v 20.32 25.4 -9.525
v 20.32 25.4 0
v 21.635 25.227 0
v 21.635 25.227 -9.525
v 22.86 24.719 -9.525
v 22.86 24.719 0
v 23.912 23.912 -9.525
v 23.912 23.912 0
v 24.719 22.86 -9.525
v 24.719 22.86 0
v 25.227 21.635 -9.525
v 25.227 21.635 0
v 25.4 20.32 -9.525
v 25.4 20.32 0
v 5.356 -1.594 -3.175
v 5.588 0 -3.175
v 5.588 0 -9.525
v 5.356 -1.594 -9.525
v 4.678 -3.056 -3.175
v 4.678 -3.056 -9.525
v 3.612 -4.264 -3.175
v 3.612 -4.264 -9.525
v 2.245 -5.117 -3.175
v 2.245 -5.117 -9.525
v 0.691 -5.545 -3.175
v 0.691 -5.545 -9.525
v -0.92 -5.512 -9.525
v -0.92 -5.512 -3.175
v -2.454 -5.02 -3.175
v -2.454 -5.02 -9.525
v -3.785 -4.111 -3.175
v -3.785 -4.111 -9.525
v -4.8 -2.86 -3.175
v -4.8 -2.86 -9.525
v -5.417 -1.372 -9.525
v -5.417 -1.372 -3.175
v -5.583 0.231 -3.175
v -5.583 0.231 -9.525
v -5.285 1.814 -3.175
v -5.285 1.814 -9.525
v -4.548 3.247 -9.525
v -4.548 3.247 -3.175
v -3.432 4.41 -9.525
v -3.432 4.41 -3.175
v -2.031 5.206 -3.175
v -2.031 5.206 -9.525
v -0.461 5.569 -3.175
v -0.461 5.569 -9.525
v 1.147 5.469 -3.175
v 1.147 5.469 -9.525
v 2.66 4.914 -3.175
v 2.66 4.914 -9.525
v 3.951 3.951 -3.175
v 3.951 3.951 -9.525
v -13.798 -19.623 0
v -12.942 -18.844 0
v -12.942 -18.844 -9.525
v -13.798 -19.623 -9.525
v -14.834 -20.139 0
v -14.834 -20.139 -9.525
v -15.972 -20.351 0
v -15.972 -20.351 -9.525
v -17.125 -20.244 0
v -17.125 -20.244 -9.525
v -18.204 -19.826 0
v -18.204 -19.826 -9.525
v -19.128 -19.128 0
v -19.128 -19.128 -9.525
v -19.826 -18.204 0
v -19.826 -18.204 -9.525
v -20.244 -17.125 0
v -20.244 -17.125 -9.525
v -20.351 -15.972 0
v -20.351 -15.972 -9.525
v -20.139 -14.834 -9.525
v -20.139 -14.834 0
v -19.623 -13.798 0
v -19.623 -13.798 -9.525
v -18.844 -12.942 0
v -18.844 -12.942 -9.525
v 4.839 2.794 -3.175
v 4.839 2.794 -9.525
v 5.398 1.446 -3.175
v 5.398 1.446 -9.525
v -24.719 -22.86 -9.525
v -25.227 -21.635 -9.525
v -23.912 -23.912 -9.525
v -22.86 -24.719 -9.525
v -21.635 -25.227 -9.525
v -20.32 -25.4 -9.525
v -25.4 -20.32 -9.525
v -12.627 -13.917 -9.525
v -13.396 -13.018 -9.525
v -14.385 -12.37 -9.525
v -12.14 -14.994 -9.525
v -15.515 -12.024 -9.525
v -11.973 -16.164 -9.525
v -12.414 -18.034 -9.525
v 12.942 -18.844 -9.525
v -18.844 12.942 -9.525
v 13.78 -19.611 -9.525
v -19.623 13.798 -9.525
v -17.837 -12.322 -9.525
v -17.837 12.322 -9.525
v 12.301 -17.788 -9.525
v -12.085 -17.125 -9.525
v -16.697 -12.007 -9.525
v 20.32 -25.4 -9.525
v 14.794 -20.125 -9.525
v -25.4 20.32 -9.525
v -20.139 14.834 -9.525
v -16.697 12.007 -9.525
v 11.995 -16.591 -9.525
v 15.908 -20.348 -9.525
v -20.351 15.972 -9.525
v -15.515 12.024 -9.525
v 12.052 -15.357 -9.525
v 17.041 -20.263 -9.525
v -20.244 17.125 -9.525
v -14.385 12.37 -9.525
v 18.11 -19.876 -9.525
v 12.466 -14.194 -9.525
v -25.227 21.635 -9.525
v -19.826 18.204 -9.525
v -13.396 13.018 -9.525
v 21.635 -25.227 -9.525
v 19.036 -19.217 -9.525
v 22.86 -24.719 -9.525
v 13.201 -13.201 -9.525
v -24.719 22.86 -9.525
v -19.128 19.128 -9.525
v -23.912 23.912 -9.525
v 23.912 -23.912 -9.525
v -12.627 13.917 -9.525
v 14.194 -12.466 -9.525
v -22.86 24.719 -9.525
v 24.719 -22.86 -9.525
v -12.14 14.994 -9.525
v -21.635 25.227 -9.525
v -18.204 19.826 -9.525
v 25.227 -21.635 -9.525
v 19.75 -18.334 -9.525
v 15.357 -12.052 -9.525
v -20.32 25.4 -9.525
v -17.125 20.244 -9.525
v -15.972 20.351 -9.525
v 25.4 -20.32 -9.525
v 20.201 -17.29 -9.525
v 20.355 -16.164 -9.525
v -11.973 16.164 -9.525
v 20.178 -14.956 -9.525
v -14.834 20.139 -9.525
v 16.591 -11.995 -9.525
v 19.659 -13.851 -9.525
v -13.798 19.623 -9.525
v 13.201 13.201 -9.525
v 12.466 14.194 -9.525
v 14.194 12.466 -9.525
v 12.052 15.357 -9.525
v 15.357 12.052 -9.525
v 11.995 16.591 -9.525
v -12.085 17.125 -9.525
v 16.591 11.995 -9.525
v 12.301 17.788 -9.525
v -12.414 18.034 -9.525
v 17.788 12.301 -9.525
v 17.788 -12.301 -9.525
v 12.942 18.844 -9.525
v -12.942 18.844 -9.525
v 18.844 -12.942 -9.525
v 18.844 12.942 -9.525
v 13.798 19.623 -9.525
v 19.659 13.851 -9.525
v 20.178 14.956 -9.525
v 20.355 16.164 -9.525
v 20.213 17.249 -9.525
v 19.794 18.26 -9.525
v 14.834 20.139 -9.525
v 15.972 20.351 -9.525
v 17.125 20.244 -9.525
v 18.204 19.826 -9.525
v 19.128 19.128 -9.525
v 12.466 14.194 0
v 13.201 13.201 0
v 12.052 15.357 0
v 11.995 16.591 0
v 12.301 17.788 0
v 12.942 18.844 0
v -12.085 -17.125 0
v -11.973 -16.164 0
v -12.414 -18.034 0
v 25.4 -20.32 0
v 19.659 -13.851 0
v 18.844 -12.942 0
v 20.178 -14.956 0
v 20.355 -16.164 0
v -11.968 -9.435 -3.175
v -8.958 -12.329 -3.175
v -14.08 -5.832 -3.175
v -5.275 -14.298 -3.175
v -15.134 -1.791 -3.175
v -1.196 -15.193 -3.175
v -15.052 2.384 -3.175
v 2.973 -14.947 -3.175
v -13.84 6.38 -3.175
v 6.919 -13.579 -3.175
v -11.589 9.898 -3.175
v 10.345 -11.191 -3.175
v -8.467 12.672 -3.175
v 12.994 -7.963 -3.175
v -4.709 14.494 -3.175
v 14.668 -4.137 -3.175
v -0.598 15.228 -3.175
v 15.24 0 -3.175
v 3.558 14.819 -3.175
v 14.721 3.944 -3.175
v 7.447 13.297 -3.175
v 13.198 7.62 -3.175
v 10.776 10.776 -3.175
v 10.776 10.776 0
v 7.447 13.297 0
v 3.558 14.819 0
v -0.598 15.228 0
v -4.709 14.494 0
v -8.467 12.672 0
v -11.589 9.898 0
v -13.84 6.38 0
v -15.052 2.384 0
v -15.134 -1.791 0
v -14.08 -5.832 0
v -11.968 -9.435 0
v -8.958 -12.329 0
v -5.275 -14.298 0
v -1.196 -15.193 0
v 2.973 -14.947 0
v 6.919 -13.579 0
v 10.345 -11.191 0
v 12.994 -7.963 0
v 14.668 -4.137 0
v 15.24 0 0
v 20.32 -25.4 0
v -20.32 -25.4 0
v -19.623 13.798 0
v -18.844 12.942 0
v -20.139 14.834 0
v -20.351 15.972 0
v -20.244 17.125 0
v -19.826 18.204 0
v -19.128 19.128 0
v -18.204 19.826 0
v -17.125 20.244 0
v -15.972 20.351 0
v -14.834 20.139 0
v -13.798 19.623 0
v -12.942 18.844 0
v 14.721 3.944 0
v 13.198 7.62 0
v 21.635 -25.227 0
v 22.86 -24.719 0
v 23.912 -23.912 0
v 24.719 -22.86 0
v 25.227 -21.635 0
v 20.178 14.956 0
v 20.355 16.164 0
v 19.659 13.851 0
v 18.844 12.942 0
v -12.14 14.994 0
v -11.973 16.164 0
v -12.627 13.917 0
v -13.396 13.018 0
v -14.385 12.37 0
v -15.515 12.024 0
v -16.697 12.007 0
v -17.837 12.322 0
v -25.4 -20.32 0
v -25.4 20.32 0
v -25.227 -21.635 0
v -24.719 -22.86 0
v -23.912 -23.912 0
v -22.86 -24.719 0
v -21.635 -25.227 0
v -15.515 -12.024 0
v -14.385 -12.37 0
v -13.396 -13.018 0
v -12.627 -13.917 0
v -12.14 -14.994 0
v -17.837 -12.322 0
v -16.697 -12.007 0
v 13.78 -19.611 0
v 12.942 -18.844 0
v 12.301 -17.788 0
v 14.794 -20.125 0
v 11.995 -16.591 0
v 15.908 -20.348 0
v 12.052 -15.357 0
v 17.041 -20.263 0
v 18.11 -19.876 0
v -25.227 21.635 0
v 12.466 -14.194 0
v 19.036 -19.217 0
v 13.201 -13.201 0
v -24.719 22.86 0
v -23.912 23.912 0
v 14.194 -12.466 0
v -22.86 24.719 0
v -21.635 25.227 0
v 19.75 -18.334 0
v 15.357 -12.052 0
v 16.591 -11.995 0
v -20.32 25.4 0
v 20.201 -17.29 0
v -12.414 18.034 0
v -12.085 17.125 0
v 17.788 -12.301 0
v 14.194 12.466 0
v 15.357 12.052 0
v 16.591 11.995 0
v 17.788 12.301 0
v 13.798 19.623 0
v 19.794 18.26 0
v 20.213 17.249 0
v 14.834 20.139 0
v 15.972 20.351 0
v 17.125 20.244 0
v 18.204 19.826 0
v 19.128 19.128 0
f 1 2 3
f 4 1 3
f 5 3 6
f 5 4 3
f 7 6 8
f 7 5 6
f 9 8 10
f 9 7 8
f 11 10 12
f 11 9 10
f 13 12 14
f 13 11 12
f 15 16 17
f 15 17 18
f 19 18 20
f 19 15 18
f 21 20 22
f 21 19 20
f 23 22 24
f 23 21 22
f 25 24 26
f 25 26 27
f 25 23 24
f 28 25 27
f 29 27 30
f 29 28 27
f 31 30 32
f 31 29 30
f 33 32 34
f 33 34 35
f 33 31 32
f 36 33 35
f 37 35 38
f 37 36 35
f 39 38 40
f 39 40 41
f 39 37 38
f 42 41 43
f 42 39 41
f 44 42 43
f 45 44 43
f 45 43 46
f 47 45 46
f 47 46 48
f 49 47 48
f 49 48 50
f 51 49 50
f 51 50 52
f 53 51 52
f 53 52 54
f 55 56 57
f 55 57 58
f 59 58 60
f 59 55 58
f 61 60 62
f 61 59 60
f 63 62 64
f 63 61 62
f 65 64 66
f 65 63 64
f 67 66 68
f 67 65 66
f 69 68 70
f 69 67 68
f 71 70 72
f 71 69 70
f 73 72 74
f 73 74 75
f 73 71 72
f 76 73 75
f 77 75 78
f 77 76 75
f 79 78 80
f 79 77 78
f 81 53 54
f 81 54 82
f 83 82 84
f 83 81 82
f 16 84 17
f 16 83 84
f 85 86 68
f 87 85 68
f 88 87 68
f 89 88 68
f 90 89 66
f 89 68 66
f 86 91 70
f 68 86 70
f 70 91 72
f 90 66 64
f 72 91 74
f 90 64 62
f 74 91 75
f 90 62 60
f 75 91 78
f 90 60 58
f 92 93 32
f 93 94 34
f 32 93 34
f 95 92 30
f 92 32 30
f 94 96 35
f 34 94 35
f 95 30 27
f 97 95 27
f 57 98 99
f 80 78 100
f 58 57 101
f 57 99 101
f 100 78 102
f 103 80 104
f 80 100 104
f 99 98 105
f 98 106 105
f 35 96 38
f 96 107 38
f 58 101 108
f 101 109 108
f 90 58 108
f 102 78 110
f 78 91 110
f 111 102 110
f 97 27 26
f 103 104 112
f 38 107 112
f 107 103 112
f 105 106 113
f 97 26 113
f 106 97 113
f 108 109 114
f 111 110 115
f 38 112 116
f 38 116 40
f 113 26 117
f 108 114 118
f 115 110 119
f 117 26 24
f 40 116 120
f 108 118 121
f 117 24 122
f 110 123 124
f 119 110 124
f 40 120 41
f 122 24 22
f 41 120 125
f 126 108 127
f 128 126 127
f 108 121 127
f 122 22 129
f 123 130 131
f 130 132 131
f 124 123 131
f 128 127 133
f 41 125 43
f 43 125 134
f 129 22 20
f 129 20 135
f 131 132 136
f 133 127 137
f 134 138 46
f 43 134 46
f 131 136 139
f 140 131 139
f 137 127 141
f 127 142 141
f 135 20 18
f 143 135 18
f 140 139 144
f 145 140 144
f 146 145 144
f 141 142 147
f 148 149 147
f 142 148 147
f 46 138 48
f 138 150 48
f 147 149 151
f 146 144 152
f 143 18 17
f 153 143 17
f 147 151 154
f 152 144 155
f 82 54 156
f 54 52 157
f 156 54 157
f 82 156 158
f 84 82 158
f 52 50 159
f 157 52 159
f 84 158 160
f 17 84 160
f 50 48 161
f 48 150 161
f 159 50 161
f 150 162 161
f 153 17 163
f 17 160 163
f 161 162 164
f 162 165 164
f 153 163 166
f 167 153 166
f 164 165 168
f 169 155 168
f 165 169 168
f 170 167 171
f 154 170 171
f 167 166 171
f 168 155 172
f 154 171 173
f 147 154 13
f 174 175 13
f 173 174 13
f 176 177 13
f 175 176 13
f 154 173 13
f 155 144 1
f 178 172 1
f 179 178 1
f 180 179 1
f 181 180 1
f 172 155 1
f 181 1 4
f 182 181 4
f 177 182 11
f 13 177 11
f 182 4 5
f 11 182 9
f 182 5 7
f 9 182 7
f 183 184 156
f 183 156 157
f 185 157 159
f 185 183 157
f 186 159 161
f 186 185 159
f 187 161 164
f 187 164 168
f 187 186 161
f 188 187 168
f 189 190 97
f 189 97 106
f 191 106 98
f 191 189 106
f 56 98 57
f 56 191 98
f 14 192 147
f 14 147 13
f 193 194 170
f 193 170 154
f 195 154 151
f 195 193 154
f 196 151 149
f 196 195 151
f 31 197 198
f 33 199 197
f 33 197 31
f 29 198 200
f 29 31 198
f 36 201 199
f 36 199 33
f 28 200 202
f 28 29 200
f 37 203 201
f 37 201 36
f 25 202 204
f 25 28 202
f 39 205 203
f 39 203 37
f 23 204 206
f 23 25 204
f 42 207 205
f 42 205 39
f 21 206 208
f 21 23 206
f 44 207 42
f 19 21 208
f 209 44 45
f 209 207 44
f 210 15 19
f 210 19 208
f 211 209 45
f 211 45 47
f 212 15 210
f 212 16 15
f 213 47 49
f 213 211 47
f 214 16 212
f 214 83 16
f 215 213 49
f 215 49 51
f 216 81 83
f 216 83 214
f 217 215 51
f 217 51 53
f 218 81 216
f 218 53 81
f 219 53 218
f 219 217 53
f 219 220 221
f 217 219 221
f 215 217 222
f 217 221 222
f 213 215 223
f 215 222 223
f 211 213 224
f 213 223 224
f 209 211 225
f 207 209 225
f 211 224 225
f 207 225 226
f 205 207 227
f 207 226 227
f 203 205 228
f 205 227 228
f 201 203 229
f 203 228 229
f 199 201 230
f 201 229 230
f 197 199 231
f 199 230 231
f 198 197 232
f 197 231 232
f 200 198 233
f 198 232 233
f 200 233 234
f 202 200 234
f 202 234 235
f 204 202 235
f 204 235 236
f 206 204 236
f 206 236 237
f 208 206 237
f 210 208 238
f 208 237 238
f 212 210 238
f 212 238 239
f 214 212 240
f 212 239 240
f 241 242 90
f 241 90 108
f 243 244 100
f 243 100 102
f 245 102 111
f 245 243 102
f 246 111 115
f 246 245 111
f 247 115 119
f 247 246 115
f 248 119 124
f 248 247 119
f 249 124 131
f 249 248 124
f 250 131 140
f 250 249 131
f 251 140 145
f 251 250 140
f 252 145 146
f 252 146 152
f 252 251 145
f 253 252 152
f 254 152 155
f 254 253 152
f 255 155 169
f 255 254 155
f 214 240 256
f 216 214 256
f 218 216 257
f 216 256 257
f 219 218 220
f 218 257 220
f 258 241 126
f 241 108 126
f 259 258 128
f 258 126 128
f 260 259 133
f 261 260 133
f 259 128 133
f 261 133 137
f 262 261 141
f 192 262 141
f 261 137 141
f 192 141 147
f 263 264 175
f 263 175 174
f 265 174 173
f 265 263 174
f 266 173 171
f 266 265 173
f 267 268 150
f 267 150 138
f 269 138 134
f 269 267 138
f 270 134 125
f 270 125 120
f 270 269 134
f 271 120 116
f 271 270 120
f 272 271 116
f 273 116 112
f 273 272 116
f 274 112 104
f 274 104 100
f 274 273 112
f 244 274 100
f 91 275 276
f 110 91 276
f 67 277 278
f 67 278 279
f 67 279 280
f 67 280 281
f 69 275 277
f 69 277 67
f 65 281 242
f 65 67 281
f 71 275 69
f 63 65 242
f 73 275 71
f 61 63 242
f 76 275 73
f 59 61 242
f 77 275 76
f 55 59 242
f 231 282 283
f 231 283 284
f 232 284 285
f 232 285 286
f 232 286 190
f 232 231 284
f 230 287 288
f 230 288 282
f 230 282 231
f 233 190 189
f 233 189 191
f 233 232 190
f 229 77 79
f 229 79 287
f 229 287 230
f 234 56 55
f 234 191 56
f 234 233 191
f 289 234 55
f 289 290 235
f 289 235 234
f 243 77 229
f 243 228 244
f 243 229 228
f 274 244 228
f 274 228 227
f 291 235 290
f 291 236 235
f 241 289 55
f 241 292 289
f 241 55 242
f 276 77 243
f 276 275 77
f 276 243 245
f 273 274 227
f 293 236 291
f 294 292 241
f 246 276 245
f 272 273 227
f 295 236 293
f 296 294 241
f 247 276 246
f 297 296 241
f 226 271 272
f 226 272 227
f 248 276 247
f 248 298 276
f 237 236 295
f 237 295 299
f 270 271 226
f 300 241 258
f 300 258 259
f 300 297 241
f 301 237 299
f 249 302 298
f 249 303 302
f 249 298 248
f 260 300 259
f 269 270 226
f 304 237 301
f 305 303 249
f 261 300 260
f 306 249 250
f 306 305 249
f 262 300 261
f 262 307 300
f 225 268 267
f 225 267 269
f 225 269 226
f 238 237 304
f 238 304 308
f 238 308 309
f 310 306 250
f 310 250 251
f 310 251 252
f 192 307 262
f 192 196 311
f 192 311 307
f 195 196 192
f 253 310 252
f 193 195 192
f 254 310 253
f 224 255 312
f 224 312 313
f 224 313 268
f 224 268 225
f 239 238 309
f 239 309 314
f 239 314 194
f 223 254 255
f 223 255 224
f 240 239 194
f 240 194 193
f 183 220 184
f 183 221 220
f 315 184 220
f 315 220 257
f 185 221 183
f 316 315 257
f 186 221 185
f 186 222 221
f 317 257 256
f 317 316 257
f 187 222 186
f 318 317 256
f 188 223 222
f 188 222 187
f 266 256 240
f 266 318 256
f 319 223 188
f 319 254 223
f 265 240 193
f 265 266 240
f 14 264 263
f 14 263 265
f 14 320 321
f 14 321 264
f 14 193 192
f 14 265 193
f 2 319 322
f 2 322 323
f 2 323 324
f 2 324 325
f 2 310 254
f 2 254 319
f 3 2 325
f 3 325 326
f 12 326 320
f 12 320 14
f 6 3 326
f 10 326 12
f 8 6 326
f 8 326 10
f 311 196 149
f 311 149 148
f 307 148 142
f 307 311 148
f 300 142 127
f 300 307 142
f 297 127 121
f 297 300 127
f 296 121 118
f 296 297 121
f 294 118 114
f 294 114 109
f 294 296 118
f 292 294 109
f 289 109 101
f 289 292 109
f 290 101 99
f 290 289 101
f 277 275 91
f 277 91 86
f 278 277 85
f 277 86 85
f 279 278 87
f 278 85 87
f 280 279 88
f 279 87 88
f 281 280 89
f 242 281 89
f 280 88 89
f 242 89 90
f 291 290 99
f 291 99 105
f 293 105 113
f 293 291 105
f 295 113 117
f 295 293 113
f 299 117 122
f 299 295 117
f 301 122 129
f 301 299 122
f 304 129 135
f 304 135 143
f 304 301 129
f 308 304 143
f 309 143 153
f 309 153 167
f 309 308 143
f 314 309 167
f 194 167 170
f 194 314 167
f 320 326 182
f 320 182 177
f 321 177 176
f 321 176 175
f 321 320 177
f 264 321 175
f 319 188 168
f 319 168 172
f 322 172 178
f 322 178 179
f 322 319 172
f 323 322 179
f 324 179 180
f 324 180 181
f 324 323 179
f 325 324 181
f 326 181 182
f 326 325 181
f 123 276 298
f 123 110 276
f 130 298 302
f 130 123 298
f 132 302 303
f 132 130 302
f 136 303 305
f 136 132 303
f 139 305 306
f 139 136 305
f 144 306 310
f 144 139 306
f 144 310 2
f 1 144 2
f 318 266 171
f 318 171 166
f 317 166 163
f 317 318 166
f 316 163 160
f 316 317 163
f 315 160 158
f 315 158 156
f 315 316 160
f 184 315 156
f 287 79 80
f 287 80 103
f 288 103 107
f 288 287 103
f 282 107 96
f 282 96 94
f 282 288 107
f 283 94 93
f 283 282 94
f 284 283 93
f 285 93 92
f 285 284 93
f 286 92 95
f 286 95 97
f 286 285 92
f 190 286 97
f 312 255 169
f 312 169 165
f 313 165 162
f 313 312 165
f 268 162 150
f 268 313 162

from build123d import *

# Parameters (mm, degrees)
F0_W     = 50.8
F0_H     = 50.8
F1_DEPTH = 9.525
F2_DEPTH = 3.175
F3_R     = 5.08


with BuildPart() as f1:
    # F0 (on Top) → F1 (new body)
    with BuildSketch(Plane.XY):
        Rectangle(F0_W, F0_H)
        with BuildLine():
            ThreePointArc((12.941801, 18.843816), (15.972171, 20.351047), (19.127946, 19.127946))
            ThreePointArc((19.127946, 19.127946), (20.03644, 17.768287), (20.355461, 16.164461))
            ThreePointArc((20.355461, 16.164461), (19.958776, 14.384671), (18.843816, 12.941801))
            ThreePointArc((18.843816, 12.941801), (21.832879, 6.775322), (22.86, 0))
            ThreePointArc((22.86, 0), (21.832879, -6.775322), (18.843816, -12.941801))
            ThreePointArc((18.843816, -12.941801), (19.958776, -14.384671), (20.355461, -16.164461))
            ThreePointArc((20.355461, -16.164461), (17.588945, -20.105949), (12.941801, -18.843816))
            ThreePointArc((12.941801, -18.843816), (0, -22.86), (-12.941801, -18.843816))
            ThreePointArc((-12.941801, -18.843816), (-19.127946, -19.127946), (-18.843816, -12.941801))
            ThreePointArc((-18.843816, -12.941801), (-22.86, 0), (-18.843816, 12.941801))
            ThreePointArc((-18.843816, 12.941801), (-19.127946, 19.127946), (-12.941801, 18.843816))
            ThreePointArc((-12.941801, 18.843816), (0, 22.86), (12.941801, 18.843816))
        make_face(mode=Mode.SUBTRACT)
        with BuildLine():
            ThreePointArc((13.200976, 13.200976), (11.977875, 15.972171), (12.941801, 18.843816))
            ThreePointArc((12.941801, 18.843816), (0, 22.86), (-12.941801, 18.843816))
            ThreePointArc((-12.941801, 18.843816), (-12.222973, 17.588945), (-11.973461, 16.164461))
            ThreePointArc((-11.973461, 16.164461), (-14.384671, 12.370146), (-18.843816, 12.941801))
            ThreePointArc((-18.843816, 12.941801), (-22.86, 0), (-18.843816, -12.941801))
            ThreePointArc((-18.843816, -12.941801), (-14.384671, -12.370146), (-11.973461, -16.164461))
            ThreePointArc((-11.973461, -16.164461), (-12.222973, -17.588945), (-12.941801, -18.843816))
            ThreePointArc((-12.941801, -18.843816), (0, -22.86), (12.941801, -18.843816))
            ThreePointArc((12.941801, -18.843816), (13.200976, -13.200976), (18.843816, -12.941801))
            ThreePointArc((18.843816, -12.941801), (21.832879, -6.775322), (22.86, 0))
            ThreePointArc((22.86, 0), (21.832879, 6.775322), (18.843816, 12.941801))
            ThreePointArc((18.843816, 12.941801), (15.972171, 11.977875), (13.200976, 13.200976))
        make_face()
        with BuildLine():
            ThreePointArc((15.24, 0), (-14.079924, -5.832096), (10.776307, 10.776307))
            ThreePointArc((10.776307, 10.776307), (14.079924, 5.832096), (15.24, 0))
        make_face(mode=Mode.SUBTRACT)
        with BuildLine():
            ThreePointArc((15.24, 0), (14.079924, 5.832096), (10.776307, 10.776307))
            ThreePointArc((10.776307, 10.776307), (-14.079924, -5.832096), (15.24, 0))
        make_face()
        with BuildLine():
            ThreePointArc((5.588, 0), (-5.162639, -2.138435), (3.951313, 3.951313))
            ThreePointArc((3.951313, 3.951313), (5.162639, 2.138435), (5.588, 0))
        make_face(mode=Mode.SUBTRACT)
    extrude(amount=-F1_DEPTH)

    # F0 (on Top) → F2 (cut)
    with BuildSketch(Plane.XY):
        with BuildLine():
            ThreePointArc((15.24, 0), (14.079924, 5.832096), (10.776307, 10.776307))
            ThreePointArc((10.776307, 10.776307), (-14.079924, -5.832096), (15.24, 0))
        make_face()
        with BuildLine():
            ThreePointArc((5.588, 0), (-5.162639, -2.138435), (3.951313, 3.951313))
            ThreePointArc((3.951313, 3.951313), (5.162639, 2.138435), (5.588, 0))
        make_face(mode=Mode.SUBTRACT)
    extrude(amount=-F2_DEPTH, mode=Mode.SUBTRACT)

    # F3
    f3_edges = [f1.edges().sort_by_distance(p)[0] for p in [
        (-25.4, -25.4, -4.7625),
        (25.4, -25.4, -4.7625),
        (25.4, 25.4, -4.7625),
        (-25.4, 25.4, -4.7625),
    ]]
    fillet(f3_edges, radius=F3_R)


solid = f1.part
